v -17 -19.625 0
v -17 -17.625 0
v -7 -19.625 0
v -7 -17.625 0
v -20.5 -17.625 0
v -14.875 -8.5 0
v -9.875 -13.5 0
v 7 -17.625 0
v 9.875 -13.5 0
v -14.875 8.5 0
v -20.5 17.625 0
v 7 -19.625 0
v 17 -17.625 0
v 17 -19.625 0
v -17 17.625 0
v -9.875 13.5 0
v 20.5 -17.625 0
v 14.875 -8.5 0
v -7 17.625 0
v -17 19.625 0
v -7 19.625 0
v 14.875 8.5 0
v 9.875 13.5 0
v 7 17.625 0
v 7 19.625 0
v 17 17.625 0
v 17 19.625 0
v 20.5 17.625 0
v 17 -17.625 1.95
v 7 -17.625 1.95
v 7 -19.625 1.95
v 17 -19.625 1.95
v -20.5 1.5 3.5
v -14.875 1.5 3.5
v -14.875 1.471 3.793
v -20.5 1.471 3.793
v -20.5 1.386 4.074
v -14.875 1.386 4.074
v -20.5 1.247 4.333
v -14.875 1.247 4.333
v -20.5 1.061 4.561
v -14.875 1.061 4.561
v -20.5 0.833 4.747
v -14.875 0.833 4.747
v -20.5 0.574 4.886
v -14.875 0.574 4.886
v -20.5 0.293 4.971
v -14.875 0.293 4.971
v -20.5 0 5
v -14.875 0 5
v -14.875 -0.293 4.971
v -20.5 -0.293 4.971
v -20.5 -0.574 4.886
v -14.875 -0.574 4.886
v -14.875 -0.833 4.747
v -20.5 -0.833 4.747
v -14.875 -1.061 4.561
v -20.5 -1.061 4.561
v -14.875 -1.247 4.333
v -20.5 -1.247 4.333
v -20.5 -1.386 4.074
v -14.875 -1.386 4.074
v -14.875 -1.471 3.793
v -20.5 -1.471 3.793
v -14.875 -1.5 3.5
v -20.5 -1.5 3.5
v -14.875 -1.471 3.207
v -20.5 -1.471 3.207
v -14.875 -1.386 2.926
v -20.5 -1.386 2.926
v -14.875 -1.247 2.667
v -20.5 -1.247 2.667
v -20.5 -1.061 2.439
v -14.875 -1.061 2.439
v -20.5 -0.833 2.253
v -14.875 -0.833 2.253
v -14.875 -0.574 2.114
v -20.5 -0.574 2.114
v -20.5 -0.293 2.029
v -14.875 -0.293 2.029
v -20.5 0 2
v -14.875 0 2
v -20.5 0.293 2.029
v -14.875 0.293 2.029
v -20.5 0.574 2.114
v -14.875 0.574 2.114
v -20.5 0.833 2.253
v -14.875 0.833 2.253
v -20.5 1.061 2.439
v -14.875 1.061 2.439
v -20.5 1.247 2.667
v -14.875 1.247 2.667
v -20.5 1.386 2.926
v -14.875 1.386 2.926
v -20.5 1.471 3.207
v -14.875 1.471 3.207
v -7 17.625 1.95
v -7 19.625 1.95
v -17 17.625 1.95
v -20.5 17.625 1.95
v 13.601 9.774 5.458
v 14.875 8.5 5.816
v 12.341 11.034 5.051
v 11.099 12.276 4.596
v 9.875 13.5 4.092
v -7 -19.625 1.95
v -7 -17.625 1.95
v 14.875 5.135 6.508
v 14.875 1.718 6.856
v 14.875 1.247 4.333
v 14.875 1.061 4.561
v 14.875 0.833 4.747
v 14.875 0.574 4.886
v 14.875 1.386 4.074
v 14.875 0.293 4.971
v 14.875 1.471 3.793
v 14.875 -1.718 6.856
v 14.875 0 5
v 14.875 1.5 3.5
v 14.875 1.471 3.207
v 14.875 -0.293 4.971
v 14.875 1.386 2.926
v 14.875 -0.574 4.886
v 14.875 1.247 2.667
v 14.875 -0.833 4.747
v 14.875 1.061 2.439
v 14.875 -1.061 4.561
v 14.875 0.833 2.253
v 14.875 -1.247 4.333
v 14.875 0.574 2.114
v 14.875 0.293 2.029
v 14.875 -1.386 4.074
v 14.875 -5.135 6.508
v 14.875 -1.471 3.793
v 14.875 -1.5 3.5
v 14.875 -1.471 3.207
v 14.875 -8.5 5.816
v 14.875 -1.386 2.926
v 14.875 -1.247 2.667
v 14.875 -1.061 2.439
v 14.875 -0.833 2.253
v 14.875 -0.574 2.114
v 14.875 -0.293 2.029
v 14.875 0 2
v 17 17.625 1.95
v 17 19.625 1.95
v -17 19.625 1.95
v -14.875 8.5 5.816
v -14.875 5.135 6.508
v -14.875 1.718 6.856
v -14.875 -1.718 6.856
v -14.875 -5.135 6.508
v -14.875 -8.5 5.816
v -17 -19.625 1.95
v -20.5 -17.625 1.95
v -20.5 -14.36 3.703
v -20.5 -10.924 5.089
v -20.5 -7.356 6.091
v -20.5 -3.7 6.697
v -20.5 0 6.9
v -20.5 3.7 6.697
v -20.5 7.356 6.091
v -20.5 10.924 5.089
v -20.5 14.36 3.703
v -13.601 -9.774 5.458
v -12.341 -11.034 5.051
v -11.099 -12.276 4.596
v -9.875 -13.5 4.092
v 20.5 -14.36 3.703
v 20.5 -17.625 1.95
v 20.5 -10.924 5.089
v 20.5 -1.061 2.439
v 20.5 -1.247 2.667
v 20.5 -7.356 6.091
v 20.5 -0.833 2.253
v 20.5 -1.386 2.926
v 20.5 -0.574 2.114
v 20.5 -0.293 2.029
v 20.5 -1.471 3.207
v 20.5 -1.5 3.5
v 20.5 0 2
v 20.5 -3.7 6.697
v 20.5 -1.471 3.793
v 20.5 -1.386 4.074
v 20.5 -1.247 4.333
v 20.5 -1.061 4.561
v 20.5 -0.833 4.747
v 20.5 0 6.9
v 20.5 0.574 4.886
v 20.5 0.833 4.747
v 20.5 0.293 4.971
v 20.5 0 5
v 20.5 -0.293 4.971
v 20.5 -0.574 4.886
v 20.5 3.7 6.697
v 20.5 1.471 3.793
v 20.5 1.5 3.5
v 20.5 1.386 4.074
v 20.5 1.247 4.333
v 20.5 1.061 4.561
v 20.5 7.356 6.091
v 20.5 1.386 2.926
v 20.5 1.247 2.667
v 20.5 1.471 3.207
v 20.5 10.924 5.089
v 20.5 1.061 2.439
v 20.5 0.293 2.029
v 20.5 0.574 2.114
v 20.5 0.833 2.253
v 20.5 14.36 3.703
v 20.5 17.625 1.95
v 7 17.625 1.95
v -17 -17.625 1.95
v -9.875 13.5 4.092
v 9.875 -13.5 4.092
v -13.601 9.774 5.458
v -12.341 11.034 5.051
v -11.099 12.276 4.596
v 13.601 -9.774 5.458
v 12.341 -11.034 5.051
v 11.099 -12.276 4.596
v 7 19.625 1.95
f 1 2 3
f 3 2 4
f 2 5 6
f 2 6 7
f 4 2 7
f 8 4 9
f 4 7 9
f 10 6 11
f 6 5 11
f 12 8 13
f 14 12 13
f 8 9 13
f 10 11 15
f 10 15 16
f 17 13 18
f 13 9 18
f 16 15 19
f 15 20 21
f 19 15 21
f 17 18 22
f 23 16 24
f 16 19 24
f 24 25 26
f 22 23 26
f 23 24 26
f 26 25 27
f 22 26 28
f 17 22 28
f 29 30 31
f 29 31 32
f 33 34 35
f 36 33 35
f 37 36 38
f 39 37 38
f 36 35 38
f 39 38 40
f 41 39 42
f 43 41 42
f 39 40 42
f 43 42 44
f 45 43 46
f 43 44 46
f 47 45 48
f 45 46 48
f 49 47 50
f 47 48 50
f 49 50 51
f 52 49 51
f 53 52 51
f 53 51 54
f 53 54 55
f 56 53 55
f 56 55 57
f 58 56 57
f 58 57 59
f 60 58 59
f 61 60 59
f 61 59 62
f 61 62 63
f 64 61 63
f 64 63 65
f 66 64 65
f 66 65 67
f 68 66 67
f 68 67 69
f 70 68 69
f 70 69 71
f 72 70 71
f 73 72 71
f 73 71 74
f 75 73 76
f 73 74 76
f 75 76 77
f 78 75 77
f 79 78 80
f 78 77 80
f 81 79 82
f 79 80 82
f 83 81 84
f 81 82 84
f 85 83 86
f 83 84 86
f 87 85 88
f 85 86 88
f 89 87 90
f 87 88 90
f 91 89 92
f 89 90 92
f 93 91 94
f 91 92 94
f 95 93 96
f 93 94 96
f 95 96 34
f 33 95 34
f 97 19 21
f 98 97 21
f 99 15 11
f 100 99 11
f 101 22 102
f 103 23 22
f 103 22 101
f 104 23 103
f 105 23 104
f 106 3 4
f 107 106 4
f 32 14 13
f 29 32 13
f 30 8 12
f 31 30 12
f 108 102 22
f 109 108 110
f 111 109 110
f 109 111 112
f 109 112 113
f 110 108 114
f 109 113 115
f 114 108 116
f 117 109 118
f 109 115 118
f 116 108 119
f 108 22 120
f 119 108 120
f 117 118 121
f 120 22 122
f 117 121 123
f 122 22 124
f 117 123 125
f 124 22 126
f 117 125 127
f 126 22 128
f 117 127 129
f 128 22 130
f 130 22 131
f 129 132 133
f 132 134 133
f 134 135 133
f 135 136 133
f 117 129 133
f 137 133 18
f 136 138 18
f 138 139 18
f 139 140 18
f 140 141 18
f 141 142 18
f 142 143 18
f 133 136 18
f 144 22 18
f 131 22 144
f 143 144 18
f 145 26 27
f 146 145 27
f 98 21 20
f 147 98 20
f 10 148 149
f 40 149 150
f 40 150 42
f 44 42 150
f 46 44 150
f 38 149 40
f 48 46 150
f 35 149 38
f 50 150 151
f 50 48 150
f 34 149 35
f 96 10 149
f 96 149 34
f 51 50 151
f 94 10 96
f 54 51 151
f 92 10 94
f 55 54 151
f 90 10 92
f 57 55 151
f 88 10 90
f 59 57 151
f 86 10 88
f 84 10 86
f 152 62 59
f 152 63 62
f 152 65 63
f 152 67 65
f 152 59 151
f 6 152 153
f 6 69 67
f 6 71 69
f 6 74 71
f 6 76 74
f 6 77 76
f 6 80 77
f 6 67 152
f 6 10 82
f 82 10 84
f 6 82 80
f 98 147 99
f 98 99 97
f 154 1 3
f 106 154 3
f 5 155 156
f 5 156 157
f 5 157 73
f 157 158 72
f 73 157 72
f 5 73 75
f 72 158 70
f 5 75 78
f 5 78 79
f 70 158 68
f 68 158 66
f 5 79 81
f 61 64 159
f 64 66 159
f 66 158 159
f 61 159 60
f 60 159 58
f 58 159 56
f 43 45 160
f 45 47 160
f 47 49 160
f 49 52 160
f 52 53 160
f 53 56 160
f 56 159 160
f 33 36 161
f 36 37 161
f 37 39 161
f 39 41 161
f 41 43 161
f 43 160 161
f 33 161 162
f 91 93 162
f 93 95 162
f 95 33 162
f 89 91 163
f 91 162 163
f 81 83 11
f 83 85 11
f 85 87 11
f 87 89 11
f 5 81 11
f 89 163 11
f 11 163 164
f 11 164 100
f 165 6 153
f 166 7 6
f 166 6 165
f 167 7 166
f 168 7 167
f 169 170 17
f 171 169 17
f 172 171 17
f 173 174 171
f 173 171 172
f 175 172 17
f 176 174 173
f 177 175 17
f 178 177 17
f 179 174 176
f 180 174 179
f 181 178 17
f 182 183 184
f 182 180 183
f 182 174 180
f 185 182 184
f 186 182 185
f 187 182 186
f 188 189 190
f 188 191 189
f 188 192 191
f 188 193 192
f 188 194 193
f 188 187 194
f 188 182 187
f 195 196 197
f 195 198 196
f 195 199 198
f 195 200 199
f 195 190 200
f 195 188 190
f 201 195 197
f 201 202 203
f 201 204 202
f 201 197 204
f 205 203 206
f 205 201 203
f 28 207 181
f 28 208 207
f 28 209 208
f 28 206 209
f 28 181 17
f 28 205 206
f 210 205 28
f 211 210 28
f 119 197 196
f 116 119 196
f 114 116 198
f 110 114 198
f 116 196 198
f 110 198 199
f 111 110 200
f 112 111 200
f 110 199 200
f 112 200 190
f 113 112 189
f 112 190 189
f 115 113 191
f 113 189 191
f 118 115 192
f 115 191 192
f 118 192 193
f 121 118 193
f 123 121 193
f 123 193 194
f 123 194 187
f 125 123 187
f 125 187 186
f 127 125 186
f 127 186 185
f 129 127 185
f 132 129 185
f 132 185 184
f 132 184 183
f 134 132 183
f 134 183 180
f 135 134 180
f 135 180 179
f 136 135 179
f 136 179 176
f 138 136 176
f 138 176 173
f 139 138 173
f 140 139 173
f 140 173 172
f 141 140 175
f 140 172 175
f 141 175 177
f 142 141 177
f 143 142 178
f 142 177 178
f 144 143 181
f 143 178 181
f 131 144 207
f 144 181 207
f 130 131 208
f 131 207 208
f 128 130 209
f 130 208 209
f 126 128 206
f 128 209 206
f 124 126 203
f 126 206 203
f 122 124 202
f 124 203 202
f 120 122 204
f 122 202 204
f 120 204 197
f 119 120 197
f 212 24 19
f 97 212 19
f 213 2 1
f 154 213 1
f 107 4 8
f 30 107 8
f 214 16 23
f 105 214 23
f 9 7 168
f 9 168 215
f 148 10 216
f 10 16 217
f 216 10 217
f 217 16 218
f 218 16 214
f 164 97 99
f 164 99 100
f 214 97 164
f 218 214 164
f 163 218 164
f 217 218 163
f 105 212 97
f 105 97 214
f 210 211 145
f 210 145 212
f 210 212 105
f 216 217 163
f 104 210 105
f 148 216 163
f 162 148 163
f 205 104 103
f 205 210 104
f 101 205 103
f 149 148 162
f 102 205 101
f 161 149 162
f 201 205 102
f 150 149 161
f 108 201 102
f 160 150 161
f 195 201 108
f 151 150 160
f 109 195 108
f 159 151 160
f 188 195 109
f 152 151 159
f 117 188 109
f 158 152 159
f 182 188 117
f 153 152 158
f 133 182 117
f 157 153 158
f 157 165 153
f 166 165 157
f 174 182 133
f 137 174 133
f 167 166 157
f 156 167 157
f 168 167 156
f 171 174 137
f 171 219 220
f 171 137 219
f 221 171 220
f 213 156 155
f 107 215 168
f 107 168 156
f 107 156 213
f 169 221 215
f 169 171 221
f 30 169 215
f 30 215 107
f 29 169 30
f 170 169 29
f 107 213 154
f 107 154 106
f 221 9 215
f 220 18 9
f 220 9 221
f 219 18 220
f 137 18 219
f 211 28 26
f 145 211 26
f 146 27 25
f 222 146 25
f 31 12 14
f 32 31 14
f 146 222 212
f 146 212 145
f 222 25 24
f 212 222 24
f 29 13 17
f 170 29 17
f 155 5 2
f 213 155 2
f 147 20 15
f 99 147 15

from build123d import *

# Parameters (mm, degrees)
F1_DEPTH = 1.95
F2_R     = 1.5
F3_DEPTH = 41
F4_W     = 29.75
F4_H     = 27
F5_DEPTH = 6.901
F6_SIZE  = 5


with BuildPart() as f1:
    # F0 (on Top) → F1 (new body)
    with BuildSketch(Plane.XY):
        Polygon((-7, 19.625), (-17, 19.625), (-17, 17.625), (-20.5, 17.625), (-20.5, -17.625), (-17, -17.625), (-17, -19.625), (-7, -19.625), (-7, -17.625), (7, -17.625), (7, -19.625), (17, -19.625), (17, -17.625), (20.5, -17.625), (20.5, 17.625), (17, 17.625), (17, 19.625), (7, 19.625), (7, 17.625), (-7, 17.625), align=None)
    extrude(amount=F1_DEPTH)

    # F2 (on face) → F3 (join, through all)
    with BuildSketch(Plane.YZ.offset(20.5)):
        with BuildLine():
            Line((-17.625, 1.95), (17.625, 1.95))
            ThreePointArc((17.625, 1.95), (0, 6.9), (-17.625, 1.95))
        make_face()
        with Locations((0, 3.5)):
            Circle(F2_R, mode=Mode.SUBTRACT)
    extrude(amount=-F3_DEPTH)

    # F4 (on face) → F5 (cut, through all)
    with BuildSketch(Plane(origin=(0, 0, 0), x_dir=(1, 0, 0), z_dir=(0, 0, -1))):
        Rectangle(F4_W, F4_H)
    extrude(amount=-F5_DEPTH, mode=Mode.SUBTRACT)

    # F6
    f6_edges = [f1.edges().sort_by_distance(p)[0] for p in [
        (14.875, -13.5, 2.045861),
        (-14.875, -13.5, 2.045861),
        (14.875, 13.5, 2.045861),
        (-14.875, 13.5, 2.045861),
    ]]
    chamfer(f6_edges, length=F6_SIZE)


solid = f1.part
